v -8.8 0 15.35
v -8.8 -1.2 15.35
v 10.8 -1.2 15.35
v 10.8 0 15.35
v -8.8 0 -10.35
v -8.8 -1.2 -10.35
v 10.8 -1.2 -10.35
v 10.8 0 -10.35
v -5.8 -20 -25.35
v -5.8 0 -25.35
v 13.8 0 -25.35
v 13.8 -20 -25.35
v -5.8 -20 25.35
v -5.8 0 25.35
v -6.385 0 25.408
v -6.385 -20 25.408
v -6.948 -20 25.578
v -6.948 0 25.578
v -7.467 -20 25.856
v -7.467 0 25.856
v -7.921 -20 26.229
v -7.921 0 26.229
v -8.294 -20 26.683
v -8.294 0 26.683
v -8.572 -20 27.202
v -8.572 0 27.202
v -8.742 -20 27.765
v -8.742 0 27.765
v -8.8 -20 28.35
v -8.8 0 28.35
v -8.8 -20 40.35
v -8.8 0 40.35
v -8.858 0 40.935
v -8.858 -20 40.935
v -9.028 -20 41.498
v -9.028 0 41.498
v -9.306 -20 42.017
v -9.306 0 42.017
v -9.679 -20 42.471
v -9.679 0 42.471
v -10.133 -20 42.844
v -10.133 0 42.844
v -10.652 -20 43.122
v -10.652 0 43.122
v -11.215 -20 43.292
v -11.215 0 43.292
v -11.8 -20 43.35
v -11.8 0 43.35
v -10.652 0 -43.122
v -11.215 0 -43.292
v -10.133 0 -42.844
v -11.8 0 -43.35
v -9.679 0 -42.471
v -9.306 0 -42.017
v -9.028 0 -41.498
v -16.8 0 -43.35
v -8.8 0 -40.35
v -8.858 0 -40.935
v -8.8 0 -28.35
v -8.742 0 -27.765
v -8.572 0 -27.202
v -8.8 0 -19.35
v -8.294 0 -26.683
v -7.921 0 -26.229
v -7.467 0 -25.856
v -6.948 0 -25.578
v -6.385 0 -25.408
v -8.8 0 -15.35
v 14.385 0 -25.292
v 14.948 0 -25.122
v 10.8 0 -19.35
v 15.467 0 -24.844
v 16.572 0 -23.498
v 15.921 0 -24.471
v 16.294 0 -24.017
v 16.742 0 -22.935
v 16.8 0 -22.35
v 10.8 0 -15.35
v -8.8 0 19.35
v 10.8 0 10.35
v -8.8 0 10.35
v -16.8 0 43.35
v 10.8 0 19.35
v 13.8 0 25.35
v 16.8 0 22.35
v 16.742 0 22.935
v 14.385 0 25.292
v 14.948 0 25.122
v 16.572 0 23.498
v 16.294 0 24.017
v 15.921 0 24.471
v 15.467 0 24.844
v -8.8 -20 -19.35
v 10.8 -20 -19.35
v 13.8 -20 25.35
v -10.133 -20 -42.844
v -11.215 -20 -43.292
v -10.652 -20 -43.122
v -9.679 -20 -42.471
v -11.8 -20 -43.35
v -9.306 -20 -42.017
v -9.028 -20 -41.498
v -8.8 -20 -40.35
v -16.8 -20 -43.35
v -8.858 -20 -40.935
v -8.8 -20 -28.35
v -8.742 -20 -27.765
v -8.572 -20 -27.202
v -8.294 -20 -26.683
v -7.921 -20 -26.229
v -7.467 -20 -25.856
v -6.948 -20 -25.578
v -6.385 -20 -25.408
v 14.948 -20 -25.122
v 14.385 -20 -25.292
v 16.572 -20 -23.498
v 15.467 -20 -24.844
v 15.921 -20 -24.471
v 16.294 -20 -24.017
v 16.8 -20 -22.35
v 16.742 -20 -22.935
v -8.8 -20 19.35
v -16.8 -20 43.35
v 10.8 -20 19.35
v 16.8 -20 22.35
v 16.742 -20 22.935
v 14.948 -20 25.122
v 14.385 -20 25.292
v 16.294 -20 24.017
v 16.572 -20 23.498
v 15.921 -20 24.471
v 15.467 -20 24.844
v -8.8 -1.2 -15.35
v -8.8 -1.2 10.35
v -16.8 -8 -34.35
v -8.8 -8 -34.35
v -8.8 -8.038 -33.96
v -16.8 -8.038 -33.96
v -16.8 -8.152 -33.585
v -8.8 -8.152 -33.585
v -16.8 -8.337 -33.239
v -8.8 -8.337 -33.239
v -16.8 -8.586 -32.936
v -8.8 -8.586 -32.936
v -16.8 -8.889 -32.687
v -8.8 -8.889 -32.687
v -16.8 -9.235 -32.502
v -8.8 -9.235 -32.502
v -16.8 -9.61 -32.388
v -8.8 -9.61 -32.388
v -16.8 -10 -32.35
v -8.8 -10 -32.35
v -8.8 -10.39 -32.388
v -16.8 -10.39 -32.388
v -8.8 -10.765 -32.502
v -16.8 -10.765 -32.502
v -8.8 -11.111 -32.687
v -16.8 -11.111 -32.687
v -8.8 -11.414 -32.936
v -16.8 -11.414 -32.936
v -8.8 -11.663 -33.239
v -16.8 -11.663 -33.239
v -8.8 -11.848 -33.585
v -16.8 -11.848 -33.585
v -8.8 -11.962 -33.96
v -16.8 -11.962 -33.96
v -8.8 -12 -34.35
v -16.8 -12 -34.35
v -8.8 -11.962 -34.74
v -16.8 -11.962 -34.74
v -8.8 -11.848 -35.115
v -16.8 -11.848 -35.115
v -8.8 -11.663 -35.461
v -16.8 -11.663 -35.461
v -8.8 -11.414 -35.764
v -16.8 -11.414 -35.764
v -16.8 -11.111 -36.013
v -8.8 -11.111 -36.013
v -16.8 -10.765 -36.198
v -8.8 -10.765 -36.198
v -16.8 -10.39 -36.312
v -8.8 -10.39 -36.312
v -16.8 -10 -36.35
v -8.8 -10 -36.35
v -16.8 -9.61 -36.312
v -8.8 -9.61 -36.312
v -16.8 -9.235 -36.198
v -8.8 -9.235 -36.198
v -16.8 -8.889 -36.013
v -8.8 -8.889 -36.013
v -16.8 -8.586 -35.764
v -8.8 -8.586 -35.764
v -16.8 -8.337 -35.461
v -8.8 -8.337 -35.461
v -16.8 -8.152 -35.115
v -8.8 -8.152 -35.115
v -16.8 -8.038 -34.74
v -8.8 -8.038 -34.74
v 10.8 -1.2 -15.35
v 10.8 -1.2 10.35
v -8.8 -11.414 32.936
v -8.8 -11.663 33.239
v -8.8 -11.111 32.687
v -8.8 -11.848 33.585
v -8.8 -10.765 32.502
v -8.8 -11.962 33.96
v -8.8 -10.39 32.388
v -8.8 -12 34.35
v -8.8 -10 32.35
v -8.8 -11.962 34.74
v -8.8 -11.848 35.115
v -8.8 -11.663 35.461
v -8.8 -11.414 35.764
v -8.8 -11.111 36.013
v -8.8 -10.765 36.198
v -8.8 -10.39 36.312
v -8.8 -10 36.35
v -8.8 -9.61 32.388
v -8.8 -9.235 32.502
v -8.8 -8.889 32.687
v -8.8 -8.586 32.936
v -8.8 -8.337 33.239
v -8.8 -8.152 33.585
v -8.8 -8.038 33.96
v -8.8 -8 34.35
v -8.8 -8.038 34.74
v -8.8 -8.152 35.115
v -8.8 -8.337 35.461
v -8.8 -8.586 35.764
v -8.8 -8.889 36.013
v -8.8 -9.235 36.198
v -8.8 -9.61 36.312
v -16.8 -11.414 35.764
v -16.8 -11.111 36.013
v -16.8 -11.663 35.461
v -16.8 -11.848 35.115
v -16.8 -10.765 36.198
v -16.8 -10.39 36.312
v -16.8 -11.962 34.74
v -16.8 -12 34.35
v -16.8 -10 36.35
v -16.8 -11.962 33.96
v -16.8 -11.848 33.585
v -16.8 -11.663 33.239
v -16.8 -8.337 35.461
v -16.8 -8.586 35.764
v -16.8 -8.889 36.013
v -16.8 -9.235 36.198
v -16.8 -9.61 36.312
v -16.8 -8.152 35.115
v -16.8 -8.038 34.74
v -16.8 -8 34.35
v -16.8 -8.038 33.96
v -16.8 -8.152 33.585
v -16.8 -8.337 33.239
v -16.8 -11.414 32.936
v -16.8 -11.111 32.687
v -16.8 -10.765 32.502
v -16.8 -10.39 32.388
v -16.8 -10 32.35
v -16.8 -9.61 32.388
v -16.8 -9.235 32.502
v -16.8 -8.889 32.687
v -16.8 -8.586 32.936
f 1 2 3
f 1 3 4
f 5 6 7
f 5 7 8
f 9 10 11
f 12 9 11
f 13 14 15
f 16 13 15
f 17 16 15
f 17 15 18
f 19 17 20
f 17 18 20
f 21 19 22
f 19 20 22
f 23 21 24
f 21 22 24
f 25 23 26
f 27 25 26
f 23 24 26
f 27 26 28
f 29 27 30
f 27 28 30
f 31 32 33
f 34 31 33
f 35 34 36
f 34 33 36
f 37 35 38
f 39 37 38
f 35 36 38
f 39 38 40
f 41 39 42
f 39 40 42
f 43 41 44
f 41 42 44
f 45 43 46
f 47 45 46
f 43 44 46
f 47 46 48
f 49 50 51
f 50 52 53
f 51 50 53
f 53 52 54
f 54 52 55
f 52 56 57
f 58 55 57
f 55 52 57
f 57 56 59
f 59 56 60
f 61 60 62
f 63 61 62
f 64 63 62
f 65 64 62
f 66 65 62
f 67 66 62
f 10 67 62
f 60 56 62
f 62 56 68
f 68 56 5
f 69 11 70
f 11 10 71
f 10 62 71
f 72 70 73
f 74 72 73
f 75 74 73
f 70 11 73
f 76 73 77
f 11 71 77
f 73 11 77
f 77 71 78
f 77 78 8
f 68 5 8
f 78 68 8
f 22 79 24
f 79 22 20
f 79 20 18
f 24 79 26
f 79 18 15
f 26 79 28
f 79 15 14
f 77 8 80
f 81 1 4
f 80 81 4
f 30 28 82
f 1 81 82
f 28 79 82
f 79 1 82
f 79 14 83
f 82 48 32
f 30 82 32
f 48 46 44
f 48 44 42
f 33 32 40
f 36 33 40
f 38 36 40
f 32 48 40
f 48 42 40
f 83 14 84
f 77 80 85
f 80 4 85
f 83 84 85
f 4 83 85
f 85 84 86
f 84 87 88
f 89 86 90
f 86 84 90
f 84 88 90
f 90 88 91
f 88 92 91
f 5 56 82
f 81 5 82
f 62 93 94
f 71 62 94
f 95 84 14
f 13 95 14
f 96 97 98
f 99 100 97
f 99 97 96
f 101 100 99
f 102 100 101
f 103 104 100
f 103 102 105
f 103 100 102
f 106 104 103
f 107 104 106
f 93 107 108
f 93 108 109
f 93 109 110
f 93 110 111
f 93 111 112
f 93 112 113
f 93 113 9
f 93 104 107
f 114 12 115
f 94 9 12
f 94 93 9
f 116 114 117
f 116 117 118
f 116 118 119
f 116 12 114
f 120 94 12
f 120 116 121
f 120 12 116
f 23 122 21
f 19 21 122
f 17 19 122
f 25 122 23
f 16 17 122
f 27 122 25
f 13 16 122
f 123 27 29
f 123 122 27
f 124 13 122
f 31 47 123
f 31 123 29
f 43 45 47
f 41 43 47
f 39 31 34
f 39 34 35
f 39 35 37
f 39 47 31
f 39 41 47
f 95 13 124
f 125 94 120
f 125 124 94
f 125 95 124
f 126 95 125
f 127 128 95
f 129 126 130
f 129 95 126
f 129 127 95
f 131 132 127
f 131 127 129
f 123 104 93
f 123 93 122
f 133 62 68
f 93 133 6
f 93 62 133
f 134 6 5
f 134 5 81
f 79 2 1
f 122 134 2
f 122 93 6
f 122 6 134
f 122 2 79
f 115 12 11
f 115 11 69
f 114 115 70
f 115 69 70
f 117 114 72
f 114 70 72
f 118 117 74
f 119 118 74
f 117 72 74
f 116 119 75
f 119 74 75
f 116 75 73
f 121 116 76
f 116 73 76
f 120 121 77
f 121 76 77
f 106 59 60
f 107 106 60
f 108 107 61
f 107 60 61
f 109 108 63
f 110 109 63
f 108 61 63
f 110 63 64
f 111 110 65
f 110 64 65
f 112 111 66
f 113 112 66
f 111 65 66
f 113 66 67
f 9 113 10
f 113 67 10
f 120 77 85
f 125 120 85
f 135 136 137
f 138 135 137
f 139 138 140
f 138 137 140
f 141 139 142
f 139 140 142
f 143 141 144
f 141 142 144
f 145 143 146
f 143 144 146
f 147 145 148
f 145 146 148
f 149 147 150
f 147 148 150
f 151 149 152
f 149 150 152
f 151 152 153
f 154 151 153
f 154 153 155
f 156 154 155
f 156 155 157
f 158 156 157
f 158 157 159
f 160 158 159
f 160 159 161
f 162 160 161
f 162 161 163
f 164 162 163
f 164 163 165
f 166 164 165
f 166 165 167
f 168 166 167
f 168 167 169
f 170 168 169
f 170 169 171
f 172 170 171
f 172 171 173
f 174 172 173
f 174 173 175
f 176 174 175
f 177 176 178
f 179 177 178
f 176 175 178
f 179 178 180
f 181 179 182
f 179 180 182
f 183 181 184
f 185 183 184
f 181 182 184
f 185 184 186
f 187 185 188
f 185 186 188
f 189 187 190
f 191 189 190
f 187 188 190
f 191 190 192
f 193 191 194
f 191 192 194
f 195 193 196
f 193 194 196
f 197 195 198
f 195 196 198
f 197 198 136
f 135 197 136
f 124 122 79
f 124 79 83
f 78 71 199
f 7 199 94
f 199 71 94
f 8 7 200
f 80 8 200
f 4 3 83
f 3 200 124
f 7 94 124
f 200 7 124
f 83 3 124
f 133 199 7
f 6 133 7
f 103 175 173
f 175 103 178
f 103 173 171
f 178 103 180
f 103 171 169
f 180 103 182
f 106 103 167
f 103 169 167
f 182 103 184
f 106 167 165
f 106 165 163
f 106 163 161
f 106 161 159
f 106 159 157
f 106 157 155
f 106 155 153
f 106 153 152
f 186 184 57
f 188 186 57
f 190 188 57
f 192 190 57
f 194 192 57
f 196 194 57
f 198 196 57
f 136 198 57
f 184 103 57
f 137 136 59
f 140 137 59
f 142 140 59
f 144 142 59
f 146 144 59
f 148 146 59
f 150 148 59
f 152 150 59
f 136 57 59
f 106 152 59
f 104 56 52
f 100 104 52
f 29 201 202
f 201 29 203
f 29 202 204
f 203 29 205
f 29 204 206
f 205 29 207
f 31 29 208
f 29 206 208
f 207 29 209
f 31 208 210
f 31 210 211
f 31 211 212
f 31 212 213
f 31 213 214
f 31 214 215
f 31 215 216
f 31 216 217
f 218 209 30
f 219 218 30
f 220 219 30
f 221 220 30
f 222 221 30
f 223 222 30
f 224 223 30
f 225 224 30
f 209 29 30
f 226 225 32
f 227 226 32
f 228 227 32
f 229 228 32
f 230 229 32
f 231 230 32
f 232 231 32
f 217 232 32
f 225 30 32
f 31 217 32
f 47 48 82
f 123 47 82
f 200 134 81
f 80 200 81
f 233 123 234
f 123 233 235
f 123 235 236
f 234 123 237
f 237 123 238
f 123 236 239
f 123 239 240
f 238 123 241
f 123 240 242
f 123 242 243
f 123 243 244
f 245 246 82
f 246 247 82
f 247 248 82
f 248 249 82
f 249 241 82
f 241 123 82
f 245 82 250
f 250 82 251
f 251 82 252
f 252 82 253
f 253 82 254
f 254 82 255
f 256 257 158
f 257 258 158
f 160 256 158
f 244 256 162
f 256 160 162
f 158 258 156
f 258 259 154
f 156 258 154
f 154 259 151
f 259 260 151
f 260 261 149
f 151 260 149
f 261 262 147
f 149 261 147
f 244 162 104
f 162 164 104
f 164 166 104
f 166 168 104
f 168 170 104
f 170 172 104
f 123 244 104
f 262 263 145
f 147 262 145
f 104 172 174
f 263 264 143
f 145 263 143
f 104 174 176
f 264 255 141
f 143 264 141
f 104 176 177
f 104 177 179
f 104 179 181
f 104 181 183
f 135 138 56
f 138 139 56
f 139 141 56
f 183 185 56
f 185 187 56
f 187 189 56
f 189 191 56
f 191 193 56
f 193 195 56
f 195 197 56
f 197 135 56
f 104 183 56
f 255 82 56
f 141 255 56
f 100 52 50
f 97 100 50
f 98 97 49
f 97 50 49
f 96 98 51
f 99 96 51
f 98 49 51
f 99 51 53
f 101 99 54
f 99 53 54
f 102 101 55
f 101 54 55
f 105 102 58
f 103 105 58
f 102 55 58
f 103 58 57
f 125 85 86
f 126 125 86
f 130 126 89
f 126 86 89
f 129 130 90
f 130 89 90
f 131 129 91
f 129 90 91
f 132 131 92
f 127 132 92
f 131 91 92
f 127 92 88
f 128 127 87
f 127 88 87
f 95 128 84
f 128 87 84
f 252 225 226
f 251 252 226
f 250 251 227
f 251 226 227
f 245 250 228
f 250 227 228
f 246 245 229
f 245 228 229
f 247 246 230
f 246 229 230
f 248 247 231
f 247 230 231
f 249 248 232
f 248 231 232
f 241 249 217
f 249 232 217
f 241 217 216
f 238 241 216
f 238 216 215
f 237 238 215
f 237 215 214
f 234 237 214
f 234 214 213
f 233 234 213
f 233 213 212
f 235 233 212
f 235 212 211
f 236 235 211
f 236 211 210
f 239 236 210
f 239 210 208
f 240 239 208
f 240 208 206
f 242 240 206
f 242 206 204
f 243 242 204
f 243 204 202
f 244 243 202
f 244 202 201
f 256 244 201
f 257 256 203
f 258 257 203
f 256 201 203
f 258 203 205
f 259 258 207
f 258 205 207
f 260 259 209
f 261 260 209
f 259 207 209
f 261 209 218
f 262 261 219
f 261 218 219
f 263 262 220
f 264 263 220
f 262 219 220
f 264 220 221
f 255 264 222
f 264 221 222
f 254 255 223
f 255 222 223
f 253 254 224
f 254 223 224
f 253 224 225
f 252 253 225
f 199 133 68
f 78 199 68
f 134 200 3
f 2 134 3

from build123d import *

# Parameters (mm, degrees)
F1_DEPTH = 20
F2_W     = 19.6
F2_H     = 38.7
F3_DEPTH = 25
F4_R     = 2
F5_DEPTH = 25
F6_W     = 1.2
F6_H     = 5
F7_DEPTH = 19.6


with BuildPart() as f1:
    # F0 (on Front) → F1 (new body)
    with BuildSketch(Plane.XZ):
        with BuildLine():
            Line((-5.8, -25.35), (13.8, -25.35))
            ThreePointArc((13.8, -25.35), (15.92132, -24.47132), (16.8, -22.35))
            Line((16.8, -22.35), (16.8, 22.35))
            ThreePointArc((16.8, 22.35), (15.92132, 24.47132), (13.8, 25.35))
            Line((13.8, 25.35), (-5.8, 25.35))
            ThreePointArc((-5.8, 25.35), (-7.92132, 26.22868), (-8.8, 28.35))
            Line((-8.8, 28.35), (-8.8, 40.35))
            ThreePointArc((-8.8, 40.35), (-9.67868, 42.47132), (-11.8, 43.35))
            Line((-11.8, 43.35), (-16.8, 43.35))
            Line((-16.8, 43.35), (-16.8, 25.35))
            Line((-16.8, 25.35), (-16.8, -25.35))
            Line((-16.8, -25.35), (-16.8, -43.35))
            Line((-16.8, -43.35), (-11.8, -43.35))
            ThreePointArc((-11.8, -43.35), (-9.67868, -42.47132), (-8.8, -40.35))
            Line((-8.8, -40.35), (-8.8, -28.35))
            ThreePointArc((-8.8, -28.35), (-7.92132, -26.22868), (-5.8, -25.35))
        make_face()
    extrude(amount=F1_DEPTH)

    # F2 (on face) → F3 (cut)
    with BuildSketch(Plane.XZ.offset(20)):
        with Locations((1, 0)):
            Rectangle(F2_W, F2_H)
    extrude(amount=-F3_DEPTH, mode=Mode.SUBTRACT)

    # F4 (on face) → F5 (cut)
    with BuildSketch(Plane.YZ.offset(-8.8)):
        with Locations((-10, 34.35)):
            Circle(F4_R)
        with Locations((-10, -34.35)):
            Circle(F4_R)
    extrude(amount=-F5_DEPTH, mode=Mode.SUBTRACT)

    # F6 (on face) → F7 (join, through all)
    with BuildSketch(Plane.YZ.offset(-8.8)):
        with Locations((-0.6, 12.85)):
            Rectangle(F6_W, F6_H)
        with Locations((-0.6, -12.85)):
            Rectangle(F6_W, F6_H)
    extrude(amount=F7_DEPTH)


solid = f1.part
